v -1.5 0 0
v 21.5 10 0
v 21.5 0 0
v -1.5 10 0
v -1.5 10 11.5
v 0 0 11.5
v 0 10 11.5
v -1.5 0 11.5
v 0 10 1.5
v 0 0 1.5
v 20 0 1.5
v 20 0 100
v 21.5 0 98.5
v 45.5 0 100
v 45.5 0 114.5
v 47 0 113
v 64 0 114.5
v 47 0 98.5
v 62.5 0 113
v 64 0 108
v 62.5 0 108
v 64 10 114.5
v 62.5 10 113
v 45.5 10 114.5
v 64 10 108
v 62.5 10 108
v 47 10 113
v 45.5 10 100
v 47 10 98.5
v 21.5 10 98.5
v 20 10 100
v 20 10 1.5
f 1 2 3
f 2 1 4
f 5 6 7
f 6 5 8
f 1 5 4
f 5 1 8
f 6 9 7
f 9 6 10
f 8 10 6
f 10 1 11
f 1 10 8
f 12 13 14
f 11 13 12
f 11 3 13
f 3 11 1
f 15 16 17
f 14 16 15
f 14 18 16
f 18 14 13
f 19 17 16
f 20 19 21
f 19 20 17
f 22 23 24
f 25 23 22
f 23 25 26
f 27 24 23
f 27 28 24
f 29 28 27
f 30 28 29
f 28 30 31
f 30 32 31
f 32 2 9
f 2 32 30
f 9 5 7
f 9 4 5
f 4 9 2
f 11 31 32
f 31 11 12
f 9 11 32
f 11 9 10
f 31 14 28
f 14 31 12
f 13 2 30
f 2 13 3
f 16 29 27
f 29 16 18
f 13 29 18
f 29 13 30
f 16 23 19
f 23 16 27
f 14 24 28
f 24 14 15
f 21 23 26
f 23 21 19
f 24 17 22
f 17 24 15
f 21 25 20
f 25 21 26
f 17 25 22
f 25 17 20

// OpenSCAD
staerke = 1.5;  // materialstaerke
breite = 10.0;   // Objektbreite
s = 5.0;
tb1 = 15.5;
th1 = 13;
tb2 = 25.5;
hh1 = 100;
hb1 = 20;
hh2 = 10;
color = "lightgreen";
/*

                _tb1_
               |     | s
           th1 |
               |
          _tb2_|
         |   
         |
         | hh1
    |    |
 hh2|____|
      hb1

*/


color(color)
//rotate([90,0,0])
{
    rotate([0, 270, 0])
        cube([hh2 + staerke, breite, staerke], false);
    cube([hb1, breite, staerke], false);

    translate([hb1 + staerke, 0, 0])
        rotate([0, 270, 0])
            cube([hh1, breite, staerke], false);

    translate([hb1 + staerke, 0, hh1 - staerke])
        cube([tb2, breite, staerke], false);
    
    translate([hb1 + staerke + tb2, 0, hh1])
        rotate([0, 270, 0])
            cube([th1 , breite, staerke], false);

    translate([hb1 + tb2, 0, hh1 + th1])
        cube([tb1+ staerke, breite, staerke], false);

    #translate([hb1 + tb2 + tb1 + staerke, 0, hh1 + th1 +staerke])
        rotate([0, 90, 0])
            cube([s+ staerke, breite, staerke], false);
}
